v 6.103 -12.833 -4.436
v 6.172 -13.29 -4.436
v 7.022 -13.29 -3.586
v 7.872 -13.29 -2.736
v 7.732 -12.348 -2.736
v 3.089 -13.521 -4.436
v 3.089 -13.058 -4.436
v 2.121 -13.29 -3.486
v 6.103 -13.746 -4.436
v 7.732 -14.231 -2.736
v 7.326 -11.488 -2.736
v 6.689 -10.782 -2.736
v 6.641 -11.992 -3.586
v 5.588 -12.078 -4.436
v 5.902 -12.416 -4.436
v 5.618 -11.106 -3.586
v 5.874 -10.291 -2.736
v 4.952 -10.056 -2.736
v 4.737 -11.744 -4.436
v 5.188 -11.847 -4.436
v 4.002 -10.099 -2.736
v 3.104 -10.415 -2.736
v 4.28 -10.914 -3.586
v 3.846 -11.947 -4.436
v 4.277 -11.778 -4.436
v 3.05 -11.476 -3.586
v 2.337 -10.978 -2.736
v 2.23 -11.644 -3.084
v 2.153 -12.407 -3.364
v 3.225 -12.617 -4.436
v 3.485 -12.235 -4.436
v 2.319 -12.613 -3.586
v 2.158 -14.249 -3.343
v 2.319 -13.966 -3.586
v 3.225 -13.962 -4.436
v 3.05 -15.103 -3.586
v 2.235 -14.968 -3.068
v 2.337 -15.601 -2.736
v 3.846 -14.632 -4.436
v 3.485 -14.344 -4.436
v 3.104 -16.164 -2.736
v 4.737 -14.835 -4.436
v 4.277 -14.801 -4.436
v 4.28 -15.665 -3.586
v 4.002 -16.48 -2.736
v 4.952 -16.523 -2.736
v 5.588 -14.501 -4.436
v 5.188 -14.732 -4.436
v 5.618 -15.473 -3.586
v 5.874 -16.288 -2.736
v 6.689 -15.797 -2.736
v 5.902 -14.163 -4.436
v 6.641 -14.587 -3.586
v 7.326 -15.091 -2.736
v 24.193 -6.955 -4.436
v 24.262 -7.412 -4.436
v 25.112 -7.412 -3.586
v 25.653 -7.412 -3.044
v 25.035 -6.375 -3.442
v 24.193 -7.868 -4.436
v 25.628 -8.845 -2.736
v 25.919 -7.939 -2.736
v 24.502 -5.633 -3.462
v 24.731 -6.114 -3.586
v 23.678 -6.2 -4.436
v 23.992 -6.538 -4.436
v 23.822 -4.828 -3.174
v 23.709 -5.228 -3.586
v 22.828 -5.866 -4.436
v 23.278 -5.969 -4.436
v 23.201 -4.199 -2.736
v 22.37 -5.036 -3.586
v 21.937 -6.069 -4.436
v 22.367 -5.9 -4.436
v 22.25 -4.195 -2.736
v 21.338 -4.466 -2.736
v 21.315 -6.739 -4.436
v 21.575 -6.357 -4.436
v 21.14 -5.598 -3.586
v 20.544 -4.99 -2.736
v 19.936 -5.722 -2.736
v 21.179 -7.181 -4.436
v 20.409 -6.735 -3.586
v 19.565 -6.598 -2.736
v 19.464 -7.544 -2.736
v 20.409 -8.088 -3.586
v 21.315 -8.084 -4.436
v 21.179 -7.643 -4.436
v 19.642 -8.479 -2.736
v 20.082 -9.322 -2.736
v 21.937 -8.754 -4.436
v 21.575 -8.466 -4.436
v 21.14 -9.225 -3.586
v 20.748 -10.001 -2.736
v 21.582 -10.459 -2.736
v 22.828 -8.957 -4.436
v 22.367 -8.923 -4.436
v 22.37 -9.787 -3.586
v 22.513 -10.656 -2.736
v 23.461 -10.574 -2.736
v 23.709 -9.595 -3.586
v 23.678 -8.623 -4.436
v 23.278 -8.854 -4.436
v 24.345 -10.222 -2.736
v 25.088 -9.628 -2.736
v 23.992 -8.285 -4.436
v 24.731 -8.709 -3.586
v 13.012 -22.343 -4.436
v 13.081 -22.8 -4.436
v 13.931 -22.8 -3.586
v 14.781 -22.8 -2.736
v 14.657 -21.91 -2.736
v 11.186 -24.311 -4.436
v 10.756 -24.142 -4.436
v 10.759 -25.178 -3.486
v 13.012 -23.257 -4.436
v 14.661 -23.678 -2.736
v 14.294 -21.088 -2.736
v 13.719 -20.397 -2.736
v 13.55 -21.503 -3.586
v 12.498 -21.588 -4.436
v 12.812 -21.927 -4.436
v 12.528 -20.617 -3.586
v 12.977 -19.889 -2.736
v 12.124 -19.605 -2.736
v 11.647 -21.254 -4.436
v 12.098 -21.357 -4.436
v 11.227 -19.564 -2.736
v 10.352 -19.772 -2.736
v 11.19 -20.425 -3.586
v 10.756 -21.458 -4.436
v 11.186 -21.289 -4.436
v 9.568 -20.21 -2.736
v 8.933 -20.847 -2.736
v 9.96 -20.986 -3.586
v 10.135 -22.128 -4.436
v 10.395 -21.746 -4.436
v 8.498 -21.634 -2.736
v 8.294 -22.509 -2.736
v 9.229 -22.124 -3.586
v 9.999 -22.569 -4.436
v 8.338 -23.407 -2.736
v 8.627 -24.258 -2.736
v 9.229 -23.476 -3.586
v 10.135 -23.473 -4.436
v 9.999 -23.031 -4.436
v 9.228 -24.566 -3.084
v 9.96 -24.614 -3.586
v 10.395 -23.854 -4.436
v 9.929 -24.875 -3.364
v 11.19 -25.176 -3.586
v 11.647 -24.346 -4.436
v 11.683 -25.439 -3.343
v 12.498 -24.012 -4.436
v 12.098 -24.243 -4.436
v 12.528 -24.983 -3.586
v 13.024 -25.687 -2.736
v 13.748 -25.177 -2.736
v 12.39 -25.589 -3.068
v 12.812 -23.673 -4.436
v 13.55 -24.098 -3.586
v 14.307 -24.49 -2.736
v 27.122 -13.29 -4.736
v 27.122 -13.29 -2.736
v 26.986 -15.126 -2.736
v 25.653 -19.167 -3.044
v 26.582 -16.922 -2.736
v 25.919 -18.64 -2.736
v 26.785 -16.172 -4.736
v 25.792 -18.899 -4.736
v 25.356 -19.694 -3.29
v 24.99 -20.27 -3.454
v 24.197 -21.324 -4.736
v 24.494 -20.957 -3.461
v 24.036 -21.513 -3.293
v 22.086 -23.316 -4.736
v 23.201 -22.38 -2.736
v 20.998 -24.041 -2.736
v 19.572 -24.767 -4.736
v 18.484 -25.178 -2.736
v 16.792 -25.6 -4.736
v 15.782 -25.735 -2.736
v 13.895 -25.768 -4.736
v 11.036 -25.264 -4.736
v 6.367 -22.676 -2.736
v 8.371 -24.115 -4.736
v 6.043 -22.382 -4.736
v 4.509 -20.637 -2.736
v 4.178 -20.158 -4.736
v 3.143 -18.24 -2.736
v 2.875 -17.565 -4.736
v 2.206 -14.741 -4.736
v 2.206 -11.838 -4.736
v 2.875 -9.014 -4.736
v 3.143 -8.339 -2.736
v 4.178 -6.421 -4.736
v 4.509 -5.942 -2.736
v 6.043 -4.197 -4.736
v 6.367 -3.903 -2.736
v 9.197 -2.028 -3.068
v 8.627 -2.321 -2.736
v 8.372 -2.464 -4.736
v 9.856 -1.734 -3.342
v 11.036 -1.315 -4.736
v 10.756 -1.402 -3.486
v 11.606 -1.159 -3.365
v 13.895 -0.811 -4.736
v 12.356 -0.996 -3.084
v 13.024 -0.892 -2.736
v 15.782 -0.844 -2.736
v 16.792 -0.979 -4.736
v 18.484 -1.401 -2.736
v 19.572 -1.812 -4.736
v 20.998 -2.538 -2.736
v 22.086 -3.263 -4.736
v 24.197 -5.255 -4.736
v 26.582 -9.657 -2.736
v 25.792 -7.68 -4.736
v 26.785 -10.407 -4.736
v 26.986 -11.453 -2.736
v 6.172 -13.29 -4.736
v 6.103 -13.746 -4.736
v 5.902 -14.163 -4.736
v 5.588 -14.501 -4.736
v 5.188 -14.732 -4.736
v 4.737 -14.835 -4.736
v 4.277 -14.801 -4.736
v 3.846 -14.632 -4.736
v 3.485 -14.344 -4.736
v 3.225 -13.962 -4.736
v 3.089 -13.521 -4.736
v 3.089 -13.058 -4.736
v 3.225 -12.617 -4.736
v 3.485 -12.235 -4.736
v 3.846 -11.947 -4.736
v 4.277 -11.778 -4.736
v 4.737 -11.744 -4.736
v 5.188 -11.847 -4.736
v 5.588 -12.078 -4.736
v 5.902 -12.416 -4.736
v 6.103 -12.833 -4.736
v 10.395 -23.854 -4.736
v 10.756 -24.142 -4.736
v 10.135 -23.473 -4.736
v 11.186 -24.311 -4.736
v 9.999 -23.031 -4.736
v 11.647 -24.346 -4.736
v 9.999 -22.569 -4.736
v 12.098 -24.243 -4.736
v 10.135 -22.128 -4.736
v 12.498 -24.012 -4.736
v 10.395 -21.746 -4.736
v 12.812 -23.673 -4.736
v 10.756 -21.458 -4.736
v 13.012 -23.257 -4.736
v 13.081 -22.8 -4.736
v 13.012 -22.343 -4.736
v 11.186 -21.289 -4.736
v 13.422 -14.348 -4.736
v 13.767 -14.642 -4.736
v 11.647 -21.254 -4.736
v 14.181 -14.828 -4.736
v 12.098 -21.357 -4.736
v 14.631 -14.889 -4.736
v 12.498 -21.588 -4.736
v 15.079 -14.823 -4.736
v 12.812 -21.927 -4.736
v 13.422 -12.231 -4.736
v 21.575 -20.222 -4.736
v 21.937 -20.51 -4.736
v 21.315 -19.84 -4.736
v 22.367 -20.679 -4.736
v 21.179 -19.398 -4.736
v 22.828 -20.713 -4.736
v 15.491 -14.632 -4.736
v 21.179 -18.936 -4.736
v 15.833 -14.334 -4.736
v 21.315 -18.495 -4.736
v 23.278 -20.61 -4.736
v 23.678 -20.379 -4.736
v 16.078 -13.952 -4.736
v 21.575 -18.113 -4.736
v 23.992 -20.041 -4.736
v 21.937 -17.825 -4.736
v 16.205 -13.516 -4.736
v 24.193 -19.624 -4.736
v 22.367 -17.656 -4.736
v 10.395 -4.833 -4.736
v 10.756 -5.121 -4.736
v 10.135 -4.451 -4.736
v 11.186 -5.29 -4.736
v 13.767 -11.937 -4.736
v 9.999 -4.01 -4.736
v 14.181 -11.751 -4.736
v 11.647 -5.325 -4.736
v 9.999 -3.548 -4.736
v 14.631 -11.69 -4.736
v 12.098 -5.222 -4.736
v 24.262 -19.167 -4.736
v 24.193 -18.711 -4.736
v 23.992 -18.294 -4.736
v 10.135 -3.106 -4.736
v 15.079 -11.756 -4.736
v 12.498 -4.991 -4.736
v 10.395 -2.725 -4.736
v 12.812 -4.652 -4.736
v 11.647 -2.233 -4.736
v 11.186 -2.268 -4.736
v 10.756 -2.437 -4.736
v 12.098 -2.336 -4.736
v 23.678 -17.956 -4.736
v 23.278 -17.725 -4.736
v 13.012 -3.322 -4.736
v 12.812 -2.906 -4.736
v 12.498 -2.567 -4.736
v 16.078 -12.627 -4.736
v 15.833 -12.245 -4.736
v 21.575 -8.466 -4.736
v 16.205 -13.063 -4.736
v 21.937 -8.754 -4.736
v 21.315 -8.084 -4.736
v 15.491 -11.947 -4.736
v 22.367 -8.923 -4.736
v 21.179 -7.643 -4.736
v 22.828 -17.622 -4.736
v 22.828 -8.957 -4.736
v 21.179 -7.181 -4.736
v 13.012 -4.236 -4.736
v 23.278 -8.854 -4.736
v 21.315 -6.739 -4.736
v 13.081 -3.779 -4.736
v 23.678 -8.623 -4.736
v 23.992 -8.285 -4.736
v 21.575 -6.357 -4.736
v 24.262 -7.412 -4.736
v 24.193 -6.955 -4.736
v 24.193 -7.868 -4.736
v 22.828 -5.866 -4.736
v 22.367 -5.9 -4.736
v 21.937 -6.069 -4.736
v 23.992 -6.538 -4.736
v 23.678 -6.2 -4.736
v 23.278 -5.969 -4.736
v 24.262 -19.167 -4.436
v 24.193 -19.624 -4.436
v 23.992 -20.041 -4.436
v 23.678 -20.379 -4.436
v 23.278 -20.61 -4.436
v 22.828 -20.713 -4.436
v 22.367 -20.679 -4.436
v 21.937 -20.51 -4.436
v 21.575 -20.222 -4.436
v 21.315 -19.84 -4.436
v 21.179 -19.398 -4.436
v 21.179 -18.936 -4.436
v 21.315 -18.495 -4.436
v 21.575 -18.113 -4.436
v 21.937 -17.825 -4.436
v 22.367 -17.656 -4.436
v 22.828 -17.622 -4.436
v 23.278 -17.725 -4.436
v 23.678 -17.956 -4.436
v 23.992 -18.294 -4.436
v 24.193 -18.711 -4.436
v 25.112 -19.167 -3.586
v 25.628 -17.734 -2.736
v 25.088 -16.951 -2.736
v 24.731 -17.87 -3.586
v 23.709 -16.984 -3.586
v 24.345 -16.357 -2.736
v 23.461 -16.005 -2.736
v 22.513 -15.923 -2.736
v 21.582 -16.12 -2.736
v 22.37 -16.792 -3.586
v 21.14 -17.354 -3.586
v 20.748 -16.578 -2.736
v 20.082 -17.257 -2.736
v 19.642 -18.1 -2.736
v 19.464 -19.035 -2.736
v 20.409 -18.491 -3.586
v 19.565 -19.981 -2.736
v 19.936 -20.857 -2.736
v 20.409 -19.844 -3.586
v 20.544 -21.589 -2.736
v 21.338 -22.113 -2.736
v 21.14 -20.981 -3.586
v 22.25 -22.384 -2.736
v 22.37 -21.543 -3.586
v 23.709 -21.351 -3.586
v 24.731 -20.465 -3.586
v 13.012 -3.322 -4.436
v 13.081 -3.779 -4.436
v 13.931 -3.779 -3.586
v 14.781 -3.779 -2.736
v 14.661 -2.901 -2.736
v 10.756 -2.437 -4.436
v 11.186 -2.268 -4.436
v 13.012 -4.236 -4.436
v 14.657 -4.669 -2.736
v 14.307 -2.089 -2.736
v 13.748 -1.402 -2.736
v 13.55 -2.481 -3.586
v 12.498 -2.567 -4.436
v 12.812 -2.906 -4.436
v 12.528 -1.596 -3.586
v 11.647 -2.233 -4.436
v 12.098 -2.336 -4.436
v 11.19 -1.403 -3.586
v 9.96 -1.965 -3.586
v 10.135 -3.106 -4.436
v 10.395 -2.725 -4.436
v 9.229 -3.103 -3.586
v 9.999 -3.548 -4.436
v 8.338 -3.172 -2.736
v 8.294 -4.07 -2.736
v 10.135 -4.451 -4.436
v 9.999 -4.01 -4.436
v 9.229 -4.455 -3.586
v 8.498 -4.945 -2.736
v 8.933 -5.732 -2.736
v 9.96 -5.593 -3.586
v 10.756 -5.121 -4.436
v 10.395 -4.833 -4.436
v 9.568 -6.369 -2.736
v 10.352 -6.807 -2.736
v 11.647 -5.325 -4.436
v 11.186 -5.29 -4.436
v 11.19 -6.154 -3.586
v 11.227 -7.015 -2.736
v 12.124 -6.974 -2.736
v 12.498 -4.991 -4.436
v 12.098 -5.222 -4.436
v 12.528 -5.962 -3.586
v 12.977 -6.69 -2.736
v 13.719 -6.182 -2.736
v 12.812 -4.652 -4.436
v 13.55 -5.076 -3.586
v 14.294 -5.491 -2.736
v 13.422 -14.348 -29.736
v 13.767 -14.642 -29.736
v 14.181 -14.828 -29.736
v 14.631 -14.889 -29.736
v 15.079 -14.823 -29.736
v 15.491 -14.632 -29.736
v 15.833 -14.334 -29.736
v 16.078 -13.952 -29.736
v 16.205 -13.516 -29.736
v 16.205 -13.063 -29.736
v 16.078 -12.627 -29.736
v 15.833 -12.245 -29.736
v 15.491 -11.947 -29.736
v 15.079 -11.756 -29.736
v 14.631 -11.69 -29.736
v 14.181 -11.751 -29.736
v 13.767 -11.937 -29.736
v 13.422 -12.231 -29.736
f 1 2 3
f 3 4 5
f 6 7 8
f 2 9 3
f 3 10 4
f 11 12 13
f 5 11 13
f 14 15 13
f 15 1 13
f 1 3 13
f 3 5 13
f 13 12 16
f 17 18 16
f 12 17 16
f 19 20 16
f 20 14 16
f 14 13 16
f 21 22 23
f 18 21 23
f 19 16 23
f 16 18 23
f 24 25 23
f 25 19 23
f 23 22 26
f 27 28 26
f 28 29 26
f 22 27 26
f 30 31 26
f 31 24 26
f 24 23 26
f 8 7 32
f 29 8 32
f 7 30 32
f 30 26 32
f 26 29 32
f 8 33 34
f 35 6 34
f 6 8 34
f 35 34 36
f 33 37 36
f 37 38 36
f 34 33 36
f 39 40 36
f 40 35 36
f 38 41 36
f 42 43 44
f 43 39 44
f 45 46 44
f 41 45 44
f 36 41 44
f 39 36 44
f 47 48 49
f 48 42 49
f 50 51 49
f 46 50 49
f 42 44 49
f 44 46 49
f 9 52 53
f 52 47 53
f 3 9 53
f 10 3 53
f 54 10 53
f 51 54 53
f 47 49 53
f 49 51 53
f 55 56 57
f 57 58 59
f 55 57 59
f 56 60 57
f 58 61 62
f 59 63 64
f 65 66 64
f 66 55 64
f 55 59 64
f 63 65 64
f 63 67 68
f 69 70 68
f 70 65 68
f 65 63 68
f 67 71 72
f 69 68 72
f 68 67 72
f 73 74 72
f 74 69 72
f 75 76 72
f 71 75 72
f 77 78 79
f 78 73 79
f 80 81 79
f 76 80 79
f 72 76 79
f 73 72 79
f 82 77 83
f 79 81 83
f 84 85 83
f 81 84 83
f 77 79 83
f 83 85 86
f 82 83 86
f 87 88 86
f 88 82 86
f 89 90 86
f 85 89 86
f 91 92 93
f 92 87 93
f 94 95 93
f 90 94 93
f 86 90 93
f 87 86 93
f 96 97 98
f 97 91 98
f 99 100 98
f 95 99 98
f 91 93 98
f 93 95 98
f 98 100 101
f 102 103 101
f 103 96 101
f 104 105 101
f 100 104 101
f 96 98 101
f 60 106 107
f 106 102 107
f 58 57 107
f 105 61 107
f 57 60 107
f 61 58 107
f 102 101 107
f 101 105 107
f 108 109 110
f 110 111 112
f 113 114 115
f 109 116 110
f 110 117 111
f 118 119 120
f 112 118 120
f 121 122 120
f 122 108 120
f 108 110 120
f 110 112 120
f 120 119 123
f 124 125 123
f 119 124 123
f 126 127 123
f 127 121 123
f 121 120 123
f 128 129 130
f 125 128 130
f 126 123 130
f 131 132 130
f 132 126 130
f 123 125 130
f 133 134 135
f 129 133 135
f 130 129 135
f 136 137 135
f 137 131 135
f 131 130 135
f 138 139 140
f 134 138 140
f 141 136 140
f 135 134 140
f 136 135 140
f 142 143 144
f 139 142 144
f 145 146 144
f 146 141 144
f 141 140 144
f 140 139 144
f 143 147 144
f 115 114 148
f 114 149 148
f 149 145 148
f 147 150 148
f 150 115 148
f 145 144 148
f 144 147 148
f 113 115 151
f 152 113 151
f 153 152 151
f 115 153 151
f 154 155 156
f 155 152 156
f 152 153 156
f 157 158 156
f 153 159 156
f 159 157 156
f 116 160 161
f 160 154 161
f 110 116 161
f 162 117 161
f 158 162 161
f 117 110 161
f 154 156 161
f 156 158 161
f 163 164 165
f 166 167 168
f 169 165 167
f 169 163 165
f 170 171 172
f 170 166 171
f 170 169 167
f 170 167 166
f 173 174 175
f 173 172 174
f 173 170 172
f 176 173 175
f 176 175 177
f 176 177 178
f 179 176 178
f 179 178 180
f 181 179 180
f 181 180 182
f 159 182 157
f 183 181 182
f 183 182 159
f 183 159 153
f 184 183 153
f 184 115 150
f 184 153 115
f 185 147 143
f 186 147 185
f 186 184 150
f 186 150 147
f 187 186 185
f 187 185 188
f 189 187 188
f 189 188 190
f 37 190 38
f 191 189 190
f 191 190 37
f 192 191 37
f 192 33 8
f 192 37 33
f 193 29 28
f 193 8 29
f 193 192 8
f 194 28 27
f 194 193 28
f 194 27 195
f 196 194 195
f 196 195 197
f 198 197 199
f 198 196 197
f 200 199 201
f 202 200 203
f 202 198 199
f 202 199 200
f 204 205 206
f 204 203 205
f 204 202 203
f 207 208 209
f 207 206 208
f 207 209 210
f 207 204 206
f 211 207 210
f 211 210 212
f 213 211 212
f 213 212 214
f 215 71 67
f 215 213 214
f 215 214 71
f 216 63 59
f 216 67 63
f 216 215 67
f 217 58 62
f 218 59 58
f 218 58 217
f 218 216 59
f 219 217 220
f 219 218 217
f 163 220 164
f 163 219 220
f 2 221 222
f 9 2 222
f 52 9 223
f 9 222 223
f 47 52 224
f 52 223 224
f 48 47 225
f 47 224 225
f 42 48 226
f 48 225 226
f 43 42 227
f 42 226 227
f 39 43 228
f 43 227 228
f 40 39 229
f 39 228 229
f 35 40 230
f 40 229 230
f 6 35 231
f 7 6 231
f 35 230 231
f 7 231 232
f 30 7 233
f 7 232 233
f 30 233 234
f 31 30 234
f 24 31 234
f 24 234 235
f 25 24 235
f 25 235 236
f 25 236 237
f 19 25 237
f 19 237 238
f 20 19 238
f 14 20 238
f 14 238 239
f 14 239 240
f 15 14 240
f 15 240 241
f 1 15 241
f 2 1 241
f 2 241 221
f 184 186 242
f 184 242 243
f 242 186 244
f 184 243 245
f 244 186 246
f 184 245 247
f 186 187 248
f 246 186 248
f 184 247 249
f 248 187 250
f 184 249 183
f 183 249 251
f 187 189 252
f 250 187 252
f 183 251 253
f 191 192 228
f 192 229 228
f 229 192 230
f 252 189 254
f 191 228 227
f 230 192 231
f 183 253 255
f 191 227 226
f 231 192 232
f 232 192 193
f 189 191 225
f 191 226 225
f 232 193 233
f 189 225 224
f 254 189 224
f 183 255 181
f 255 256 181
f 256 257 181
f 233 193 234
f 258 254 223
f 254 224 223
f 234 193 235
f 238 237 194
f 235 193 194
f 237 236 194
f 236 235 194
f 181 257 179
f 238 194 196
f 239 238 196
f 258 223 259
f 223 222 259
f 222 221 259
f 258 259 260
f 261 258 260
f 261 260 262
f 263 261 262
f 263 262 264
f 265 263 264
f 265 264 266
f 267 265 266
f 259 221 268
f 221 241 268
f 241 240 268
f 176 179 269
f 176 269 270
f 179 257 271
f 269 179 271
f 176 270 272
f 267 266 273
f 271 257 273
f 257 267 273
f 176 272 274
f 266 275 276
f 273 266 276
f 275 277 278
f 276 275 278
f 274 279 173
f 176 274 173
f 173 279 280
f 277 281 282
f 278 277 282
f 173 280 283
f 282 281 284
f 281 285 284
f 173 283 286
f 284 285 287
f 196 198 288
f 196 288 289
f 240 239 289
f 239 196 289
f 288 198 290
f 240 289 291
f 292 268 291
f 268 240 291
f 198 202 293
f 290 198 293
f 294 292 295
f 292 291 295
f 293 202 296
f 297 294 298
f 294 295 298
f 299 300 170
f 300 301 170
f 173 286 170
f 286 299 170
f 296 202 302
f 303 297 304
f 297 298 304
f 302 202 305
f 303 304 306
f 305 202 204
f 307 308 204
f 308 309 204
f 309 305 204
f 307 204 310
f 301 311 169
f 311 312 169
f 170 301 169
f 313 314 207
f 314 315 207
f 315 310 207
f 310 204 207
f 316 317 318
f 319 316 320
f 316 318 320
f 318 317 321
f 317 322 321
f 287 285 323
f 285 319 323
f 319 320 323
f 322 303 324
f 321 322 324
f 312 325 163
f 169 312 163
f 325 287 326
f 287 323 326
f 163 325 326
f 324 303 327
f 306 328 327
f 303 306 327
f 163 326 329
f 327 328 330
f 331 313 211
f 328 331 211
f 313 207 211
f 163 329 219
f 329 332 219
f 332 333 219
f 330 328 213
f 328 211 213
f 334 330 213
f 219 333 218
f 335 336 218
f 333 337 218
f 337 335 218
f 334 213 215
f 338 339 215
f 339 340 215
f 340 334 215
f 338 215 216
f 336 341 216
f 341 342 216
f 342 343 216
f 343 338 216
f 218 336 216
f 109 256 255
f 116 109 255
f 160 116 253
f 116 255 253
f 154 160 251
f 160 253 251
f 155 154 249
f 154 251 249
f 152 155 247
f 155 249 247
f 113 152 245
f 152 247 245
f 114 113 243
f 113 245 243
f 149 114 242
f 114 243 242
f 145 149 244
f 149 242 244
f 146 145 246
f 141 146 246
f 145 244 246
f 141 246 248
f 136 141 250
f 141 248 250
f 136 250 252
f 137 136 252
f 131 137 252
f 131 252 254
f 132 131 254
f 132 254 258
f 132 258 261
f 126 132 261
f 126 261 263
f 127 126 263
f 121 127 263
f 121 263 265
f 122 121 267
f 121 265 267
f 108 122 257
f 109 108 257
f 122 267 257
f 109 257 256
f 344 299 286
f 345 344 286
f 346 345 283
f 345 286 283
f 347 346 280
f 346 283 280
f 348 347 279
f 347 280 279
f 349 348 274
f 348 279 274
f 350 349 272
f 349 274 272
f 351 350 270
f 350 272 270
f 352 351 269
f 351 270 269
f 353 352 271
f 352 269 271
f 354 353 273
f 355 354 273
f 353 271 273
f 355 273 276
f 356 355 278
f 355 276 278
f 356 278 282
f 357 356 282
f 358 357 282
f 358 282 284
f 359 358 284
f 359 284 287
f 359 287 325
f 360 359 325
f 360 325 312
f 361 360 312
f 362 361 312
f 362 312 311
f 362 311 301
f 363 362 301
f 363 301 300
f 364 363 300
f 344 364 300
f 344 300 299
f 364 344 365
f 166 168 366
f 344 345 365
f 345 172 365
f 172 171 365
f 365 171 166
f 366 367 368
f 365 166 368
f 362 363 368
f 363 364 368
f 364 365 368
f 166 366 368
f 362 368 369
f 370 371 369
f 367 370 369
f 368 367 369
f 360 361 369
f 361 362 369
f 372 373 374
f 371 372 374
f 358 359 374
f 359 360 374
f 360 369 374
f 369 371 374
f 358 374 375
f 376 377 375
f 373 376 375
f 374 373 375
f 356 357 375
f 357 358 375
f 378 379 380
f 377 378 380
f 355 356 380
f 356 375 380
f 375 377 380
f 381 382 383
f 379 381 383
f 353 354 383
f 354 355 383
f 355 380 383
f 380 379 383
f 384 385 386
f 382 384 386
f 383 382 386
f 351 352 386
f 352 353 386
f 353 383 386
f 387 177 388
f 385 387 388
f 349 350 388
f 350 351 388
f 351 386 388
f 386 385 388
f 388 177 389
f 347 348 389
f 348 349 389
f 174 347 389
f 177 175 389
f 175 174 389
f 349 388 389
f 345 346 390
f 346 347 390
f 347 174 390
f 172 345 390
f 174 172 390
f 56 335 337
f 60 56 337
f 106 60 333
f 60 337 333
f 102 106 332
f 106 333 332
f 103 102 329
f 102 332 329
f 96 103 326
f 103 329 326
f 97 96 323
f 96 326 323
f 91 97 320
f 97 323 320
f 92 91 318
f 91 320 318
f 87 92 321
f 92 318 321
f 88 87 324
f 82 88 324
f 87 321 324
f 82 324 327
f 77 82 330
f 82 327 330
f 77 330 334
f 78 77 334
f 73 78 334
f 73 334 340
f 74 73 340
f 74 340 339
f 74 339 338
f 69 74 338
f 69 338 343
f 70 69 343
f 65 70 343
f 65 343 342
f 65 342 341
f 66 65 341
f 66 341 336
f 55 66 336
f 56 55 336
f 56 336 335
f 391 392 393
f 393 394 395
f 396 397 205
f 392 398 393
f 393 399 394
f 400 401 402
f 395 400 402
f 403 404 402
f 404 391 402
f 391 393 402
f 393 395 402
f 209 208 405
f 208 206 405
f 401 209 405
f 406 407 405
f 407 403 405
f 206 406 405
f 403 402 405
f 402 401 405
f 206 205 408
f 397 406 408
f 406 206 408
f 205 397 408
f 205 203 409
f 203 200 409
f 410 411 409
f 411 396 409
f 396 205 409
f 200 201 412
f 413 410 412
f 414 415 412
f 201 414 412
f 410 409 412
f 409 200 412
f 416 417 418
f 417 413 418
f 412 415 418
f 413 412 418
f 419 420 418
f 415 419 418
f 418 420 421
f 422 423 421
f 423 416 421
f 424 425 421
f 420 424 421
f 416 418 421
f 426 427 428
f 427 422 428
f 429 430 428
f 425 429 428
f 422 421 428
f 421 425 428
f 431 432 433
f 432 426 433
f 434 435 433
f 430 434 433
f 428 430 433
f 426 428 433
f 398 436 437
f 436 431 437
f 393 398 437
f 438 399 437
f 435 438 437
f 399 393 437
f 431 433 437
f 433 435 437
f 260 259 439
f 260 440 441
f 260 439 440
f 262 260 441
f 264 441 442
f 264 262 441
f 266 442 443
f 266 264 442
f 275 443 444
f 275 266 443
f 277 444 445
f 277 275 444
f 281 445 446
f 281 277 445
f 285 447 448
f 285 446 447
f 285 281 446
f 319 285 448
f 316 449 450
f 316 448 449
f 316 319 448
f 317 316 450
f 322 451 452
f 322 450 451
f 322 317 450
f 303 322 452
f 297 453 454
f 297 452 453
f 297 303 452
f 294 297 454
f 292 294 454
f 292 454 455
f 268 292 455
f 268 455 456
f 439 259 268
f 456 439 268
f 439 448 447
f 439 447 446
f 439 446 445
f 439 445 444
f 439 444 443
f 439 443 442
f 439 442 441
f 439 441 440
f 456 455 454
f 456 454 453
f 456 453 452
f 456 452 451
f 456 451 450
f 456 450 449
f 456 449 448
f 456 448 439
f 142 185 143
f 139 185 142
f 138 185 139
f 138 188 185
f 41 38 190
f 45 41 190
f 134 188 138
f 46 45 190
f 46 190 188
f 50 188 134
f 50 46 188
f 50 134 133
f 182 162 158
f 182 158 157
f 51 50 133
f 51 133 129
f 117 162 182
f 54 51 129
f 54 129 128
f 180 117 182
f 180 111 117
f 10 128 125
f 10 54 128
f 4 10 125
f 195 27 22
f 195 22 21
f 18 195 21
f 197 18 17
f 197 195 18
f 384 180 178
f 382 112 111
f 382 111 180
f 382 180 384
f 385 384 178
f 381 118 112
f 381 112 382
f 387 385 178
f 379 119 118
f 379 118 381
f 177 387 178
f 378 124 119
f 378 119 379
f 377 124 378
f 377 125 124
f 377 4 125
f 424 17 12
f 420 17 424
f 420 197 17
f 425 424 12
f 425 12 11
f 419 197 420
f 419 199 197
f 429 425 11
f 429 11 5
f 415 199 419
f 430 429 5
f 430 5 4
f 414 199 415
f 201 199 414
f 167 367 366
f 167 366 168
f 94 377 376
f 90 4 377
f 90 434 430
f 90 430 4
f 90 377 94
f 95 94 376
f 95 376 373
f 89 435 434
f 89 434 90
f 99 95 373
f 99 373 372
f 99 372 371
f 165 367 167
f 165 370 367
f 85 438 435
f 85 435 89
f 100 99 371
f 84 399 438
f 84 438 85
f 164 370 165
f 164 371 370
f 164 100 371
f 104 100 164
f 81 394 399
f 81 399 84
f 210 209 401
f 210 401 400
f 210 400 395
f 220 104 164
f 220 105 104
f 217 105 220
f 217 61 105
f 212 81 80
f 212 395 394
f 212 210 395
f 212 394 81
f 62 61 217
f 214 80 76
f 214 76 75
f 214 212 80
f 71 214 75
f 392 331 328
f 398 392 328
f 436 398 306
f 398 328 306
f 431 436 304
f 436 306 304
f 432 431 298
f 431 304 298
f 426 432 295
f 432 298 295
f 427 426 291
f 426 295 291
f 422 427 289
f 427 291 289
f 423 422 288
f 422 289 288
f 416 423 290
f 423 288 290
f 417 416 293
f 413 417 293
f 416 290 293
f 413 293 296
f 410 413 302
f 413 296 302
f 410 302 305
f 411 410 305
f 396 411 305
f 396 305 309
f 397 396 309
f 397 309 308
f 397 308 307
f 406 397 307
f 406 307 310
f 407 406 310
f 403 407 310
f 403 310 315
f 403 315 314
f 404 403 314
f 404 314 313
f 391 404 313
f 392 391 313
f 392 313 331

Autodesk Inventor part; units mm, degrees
ref_plane "YZ Plane" through (0, 0, 0) normal (1, 0, 0) x (0, 1, 0)
ref_plane "XZ Plane" through (0, 0, 0) normal (0, 1, 0) x (-1, 0, 0)
ref_plane "XY Plane" through (0, 0, 0) normal (0, 0, 1) x (1, 0, 0)
ref_plane "Work Plane1" through (14.6215, -13.2895, -4.736) normal (0, 0, 1) x (1, 0, 0)
sketch "Sketch1" plane through (14.6215, -13.2895, -4.736) normal (0, 0, 1) x (1, 0, 0)
  circle A0 centre (0, 0) radius 4 projected
  arc A1 (-1.3, -1.0954) -> (-1.3, 1.0954) centre (0, 0) ccw projected
  line L0 (-1.3, -1.0954) -> (-1.3, 1.0954) projected
  circle A2 centre (0, 0) radius 6
  circle A3 centre (0, 0) radius 12.5
  circle A4 centre (0, 0) radius 1.3331
  point P0 (-14.6215, 13.2895)
  dimension "d0" = 12
  dimension "d1" = 25
extrude "Extrusion1" add sketch "Sketch1" along normal blind 2 contours A0 | L0 A4 A1 | A4 L0 | L0 A4 | A2 | A3
sketch "Sketch2" plane through (14.6215, -13.2895, -4.736) normal (0, 0, 1) x (1, 0, 0)
  circle A0 centre (0, 0) radius 4 projected
  arc A1 (-1.3, -1.0954) -> (-1.3, 1.0954) centre (0, 0) ccw projected
  line L0 (-1.3, -1.0954) -> (-1.3, 1.0954) projected
  circle A2 centre (0, 0) radius 6
  circle A3 centre (0, 0) radius 12.5
  circle A4 centre (-10, 0) radius 1.55
  circle A5 centre (-3.0902, -9.5106) radius 1.55
  circle A6 centre (8.0902, -5.8779) radius 1.55
  circle A7 centre (8.0902, 5.8779) radius 1.55
  circle A8 centre (-3.0902, 9.5106) radius 1.55
  point P0 (-14.6215, 13.2895)
  dimension "d4" = 12
  dimension "d5" = 25
  dimension "d6" = 3.1
  dimension "d7" = 10
  dimension "d10" = 360
extrude "Extrusion2" cut sketch "Sketch2" along normal blind 22 contours A4 | A5 | A6 | A7 | A8
chamfer "Chamfer1" distance 1.7 angle 45 5 edges at (9.9813, -3.779, -2.736) (3.0715, -13.2895, -2.736) (21.1616, -7.4117, -2.736) (21.1616, -19.1674, -2.736) (9.9813, -22.8001, -2.736)
sketch "Sketch3" plane through (14.6215, -13.2895, -4.736) normal (0, 0, -1) x (-1, 0, 0)
  circle A0 centre (0, 0) radius 1.6
  line L0 (1.2, -1.0583) -> (1.2, 1.0583)
  point P0 (14.6215, 13.2895)
  point P1 (0.6764, 1.45)
  point P2 (-0.6764, 1.45)
  dimension "d17" = 3.2
  dimension "d21" = 1.2
extrude "Extrusion3" add sketch "Sketch3" along normal blind 25 contours L0 A0 picked at (0.2667, 0)
properties part number "formadol"
